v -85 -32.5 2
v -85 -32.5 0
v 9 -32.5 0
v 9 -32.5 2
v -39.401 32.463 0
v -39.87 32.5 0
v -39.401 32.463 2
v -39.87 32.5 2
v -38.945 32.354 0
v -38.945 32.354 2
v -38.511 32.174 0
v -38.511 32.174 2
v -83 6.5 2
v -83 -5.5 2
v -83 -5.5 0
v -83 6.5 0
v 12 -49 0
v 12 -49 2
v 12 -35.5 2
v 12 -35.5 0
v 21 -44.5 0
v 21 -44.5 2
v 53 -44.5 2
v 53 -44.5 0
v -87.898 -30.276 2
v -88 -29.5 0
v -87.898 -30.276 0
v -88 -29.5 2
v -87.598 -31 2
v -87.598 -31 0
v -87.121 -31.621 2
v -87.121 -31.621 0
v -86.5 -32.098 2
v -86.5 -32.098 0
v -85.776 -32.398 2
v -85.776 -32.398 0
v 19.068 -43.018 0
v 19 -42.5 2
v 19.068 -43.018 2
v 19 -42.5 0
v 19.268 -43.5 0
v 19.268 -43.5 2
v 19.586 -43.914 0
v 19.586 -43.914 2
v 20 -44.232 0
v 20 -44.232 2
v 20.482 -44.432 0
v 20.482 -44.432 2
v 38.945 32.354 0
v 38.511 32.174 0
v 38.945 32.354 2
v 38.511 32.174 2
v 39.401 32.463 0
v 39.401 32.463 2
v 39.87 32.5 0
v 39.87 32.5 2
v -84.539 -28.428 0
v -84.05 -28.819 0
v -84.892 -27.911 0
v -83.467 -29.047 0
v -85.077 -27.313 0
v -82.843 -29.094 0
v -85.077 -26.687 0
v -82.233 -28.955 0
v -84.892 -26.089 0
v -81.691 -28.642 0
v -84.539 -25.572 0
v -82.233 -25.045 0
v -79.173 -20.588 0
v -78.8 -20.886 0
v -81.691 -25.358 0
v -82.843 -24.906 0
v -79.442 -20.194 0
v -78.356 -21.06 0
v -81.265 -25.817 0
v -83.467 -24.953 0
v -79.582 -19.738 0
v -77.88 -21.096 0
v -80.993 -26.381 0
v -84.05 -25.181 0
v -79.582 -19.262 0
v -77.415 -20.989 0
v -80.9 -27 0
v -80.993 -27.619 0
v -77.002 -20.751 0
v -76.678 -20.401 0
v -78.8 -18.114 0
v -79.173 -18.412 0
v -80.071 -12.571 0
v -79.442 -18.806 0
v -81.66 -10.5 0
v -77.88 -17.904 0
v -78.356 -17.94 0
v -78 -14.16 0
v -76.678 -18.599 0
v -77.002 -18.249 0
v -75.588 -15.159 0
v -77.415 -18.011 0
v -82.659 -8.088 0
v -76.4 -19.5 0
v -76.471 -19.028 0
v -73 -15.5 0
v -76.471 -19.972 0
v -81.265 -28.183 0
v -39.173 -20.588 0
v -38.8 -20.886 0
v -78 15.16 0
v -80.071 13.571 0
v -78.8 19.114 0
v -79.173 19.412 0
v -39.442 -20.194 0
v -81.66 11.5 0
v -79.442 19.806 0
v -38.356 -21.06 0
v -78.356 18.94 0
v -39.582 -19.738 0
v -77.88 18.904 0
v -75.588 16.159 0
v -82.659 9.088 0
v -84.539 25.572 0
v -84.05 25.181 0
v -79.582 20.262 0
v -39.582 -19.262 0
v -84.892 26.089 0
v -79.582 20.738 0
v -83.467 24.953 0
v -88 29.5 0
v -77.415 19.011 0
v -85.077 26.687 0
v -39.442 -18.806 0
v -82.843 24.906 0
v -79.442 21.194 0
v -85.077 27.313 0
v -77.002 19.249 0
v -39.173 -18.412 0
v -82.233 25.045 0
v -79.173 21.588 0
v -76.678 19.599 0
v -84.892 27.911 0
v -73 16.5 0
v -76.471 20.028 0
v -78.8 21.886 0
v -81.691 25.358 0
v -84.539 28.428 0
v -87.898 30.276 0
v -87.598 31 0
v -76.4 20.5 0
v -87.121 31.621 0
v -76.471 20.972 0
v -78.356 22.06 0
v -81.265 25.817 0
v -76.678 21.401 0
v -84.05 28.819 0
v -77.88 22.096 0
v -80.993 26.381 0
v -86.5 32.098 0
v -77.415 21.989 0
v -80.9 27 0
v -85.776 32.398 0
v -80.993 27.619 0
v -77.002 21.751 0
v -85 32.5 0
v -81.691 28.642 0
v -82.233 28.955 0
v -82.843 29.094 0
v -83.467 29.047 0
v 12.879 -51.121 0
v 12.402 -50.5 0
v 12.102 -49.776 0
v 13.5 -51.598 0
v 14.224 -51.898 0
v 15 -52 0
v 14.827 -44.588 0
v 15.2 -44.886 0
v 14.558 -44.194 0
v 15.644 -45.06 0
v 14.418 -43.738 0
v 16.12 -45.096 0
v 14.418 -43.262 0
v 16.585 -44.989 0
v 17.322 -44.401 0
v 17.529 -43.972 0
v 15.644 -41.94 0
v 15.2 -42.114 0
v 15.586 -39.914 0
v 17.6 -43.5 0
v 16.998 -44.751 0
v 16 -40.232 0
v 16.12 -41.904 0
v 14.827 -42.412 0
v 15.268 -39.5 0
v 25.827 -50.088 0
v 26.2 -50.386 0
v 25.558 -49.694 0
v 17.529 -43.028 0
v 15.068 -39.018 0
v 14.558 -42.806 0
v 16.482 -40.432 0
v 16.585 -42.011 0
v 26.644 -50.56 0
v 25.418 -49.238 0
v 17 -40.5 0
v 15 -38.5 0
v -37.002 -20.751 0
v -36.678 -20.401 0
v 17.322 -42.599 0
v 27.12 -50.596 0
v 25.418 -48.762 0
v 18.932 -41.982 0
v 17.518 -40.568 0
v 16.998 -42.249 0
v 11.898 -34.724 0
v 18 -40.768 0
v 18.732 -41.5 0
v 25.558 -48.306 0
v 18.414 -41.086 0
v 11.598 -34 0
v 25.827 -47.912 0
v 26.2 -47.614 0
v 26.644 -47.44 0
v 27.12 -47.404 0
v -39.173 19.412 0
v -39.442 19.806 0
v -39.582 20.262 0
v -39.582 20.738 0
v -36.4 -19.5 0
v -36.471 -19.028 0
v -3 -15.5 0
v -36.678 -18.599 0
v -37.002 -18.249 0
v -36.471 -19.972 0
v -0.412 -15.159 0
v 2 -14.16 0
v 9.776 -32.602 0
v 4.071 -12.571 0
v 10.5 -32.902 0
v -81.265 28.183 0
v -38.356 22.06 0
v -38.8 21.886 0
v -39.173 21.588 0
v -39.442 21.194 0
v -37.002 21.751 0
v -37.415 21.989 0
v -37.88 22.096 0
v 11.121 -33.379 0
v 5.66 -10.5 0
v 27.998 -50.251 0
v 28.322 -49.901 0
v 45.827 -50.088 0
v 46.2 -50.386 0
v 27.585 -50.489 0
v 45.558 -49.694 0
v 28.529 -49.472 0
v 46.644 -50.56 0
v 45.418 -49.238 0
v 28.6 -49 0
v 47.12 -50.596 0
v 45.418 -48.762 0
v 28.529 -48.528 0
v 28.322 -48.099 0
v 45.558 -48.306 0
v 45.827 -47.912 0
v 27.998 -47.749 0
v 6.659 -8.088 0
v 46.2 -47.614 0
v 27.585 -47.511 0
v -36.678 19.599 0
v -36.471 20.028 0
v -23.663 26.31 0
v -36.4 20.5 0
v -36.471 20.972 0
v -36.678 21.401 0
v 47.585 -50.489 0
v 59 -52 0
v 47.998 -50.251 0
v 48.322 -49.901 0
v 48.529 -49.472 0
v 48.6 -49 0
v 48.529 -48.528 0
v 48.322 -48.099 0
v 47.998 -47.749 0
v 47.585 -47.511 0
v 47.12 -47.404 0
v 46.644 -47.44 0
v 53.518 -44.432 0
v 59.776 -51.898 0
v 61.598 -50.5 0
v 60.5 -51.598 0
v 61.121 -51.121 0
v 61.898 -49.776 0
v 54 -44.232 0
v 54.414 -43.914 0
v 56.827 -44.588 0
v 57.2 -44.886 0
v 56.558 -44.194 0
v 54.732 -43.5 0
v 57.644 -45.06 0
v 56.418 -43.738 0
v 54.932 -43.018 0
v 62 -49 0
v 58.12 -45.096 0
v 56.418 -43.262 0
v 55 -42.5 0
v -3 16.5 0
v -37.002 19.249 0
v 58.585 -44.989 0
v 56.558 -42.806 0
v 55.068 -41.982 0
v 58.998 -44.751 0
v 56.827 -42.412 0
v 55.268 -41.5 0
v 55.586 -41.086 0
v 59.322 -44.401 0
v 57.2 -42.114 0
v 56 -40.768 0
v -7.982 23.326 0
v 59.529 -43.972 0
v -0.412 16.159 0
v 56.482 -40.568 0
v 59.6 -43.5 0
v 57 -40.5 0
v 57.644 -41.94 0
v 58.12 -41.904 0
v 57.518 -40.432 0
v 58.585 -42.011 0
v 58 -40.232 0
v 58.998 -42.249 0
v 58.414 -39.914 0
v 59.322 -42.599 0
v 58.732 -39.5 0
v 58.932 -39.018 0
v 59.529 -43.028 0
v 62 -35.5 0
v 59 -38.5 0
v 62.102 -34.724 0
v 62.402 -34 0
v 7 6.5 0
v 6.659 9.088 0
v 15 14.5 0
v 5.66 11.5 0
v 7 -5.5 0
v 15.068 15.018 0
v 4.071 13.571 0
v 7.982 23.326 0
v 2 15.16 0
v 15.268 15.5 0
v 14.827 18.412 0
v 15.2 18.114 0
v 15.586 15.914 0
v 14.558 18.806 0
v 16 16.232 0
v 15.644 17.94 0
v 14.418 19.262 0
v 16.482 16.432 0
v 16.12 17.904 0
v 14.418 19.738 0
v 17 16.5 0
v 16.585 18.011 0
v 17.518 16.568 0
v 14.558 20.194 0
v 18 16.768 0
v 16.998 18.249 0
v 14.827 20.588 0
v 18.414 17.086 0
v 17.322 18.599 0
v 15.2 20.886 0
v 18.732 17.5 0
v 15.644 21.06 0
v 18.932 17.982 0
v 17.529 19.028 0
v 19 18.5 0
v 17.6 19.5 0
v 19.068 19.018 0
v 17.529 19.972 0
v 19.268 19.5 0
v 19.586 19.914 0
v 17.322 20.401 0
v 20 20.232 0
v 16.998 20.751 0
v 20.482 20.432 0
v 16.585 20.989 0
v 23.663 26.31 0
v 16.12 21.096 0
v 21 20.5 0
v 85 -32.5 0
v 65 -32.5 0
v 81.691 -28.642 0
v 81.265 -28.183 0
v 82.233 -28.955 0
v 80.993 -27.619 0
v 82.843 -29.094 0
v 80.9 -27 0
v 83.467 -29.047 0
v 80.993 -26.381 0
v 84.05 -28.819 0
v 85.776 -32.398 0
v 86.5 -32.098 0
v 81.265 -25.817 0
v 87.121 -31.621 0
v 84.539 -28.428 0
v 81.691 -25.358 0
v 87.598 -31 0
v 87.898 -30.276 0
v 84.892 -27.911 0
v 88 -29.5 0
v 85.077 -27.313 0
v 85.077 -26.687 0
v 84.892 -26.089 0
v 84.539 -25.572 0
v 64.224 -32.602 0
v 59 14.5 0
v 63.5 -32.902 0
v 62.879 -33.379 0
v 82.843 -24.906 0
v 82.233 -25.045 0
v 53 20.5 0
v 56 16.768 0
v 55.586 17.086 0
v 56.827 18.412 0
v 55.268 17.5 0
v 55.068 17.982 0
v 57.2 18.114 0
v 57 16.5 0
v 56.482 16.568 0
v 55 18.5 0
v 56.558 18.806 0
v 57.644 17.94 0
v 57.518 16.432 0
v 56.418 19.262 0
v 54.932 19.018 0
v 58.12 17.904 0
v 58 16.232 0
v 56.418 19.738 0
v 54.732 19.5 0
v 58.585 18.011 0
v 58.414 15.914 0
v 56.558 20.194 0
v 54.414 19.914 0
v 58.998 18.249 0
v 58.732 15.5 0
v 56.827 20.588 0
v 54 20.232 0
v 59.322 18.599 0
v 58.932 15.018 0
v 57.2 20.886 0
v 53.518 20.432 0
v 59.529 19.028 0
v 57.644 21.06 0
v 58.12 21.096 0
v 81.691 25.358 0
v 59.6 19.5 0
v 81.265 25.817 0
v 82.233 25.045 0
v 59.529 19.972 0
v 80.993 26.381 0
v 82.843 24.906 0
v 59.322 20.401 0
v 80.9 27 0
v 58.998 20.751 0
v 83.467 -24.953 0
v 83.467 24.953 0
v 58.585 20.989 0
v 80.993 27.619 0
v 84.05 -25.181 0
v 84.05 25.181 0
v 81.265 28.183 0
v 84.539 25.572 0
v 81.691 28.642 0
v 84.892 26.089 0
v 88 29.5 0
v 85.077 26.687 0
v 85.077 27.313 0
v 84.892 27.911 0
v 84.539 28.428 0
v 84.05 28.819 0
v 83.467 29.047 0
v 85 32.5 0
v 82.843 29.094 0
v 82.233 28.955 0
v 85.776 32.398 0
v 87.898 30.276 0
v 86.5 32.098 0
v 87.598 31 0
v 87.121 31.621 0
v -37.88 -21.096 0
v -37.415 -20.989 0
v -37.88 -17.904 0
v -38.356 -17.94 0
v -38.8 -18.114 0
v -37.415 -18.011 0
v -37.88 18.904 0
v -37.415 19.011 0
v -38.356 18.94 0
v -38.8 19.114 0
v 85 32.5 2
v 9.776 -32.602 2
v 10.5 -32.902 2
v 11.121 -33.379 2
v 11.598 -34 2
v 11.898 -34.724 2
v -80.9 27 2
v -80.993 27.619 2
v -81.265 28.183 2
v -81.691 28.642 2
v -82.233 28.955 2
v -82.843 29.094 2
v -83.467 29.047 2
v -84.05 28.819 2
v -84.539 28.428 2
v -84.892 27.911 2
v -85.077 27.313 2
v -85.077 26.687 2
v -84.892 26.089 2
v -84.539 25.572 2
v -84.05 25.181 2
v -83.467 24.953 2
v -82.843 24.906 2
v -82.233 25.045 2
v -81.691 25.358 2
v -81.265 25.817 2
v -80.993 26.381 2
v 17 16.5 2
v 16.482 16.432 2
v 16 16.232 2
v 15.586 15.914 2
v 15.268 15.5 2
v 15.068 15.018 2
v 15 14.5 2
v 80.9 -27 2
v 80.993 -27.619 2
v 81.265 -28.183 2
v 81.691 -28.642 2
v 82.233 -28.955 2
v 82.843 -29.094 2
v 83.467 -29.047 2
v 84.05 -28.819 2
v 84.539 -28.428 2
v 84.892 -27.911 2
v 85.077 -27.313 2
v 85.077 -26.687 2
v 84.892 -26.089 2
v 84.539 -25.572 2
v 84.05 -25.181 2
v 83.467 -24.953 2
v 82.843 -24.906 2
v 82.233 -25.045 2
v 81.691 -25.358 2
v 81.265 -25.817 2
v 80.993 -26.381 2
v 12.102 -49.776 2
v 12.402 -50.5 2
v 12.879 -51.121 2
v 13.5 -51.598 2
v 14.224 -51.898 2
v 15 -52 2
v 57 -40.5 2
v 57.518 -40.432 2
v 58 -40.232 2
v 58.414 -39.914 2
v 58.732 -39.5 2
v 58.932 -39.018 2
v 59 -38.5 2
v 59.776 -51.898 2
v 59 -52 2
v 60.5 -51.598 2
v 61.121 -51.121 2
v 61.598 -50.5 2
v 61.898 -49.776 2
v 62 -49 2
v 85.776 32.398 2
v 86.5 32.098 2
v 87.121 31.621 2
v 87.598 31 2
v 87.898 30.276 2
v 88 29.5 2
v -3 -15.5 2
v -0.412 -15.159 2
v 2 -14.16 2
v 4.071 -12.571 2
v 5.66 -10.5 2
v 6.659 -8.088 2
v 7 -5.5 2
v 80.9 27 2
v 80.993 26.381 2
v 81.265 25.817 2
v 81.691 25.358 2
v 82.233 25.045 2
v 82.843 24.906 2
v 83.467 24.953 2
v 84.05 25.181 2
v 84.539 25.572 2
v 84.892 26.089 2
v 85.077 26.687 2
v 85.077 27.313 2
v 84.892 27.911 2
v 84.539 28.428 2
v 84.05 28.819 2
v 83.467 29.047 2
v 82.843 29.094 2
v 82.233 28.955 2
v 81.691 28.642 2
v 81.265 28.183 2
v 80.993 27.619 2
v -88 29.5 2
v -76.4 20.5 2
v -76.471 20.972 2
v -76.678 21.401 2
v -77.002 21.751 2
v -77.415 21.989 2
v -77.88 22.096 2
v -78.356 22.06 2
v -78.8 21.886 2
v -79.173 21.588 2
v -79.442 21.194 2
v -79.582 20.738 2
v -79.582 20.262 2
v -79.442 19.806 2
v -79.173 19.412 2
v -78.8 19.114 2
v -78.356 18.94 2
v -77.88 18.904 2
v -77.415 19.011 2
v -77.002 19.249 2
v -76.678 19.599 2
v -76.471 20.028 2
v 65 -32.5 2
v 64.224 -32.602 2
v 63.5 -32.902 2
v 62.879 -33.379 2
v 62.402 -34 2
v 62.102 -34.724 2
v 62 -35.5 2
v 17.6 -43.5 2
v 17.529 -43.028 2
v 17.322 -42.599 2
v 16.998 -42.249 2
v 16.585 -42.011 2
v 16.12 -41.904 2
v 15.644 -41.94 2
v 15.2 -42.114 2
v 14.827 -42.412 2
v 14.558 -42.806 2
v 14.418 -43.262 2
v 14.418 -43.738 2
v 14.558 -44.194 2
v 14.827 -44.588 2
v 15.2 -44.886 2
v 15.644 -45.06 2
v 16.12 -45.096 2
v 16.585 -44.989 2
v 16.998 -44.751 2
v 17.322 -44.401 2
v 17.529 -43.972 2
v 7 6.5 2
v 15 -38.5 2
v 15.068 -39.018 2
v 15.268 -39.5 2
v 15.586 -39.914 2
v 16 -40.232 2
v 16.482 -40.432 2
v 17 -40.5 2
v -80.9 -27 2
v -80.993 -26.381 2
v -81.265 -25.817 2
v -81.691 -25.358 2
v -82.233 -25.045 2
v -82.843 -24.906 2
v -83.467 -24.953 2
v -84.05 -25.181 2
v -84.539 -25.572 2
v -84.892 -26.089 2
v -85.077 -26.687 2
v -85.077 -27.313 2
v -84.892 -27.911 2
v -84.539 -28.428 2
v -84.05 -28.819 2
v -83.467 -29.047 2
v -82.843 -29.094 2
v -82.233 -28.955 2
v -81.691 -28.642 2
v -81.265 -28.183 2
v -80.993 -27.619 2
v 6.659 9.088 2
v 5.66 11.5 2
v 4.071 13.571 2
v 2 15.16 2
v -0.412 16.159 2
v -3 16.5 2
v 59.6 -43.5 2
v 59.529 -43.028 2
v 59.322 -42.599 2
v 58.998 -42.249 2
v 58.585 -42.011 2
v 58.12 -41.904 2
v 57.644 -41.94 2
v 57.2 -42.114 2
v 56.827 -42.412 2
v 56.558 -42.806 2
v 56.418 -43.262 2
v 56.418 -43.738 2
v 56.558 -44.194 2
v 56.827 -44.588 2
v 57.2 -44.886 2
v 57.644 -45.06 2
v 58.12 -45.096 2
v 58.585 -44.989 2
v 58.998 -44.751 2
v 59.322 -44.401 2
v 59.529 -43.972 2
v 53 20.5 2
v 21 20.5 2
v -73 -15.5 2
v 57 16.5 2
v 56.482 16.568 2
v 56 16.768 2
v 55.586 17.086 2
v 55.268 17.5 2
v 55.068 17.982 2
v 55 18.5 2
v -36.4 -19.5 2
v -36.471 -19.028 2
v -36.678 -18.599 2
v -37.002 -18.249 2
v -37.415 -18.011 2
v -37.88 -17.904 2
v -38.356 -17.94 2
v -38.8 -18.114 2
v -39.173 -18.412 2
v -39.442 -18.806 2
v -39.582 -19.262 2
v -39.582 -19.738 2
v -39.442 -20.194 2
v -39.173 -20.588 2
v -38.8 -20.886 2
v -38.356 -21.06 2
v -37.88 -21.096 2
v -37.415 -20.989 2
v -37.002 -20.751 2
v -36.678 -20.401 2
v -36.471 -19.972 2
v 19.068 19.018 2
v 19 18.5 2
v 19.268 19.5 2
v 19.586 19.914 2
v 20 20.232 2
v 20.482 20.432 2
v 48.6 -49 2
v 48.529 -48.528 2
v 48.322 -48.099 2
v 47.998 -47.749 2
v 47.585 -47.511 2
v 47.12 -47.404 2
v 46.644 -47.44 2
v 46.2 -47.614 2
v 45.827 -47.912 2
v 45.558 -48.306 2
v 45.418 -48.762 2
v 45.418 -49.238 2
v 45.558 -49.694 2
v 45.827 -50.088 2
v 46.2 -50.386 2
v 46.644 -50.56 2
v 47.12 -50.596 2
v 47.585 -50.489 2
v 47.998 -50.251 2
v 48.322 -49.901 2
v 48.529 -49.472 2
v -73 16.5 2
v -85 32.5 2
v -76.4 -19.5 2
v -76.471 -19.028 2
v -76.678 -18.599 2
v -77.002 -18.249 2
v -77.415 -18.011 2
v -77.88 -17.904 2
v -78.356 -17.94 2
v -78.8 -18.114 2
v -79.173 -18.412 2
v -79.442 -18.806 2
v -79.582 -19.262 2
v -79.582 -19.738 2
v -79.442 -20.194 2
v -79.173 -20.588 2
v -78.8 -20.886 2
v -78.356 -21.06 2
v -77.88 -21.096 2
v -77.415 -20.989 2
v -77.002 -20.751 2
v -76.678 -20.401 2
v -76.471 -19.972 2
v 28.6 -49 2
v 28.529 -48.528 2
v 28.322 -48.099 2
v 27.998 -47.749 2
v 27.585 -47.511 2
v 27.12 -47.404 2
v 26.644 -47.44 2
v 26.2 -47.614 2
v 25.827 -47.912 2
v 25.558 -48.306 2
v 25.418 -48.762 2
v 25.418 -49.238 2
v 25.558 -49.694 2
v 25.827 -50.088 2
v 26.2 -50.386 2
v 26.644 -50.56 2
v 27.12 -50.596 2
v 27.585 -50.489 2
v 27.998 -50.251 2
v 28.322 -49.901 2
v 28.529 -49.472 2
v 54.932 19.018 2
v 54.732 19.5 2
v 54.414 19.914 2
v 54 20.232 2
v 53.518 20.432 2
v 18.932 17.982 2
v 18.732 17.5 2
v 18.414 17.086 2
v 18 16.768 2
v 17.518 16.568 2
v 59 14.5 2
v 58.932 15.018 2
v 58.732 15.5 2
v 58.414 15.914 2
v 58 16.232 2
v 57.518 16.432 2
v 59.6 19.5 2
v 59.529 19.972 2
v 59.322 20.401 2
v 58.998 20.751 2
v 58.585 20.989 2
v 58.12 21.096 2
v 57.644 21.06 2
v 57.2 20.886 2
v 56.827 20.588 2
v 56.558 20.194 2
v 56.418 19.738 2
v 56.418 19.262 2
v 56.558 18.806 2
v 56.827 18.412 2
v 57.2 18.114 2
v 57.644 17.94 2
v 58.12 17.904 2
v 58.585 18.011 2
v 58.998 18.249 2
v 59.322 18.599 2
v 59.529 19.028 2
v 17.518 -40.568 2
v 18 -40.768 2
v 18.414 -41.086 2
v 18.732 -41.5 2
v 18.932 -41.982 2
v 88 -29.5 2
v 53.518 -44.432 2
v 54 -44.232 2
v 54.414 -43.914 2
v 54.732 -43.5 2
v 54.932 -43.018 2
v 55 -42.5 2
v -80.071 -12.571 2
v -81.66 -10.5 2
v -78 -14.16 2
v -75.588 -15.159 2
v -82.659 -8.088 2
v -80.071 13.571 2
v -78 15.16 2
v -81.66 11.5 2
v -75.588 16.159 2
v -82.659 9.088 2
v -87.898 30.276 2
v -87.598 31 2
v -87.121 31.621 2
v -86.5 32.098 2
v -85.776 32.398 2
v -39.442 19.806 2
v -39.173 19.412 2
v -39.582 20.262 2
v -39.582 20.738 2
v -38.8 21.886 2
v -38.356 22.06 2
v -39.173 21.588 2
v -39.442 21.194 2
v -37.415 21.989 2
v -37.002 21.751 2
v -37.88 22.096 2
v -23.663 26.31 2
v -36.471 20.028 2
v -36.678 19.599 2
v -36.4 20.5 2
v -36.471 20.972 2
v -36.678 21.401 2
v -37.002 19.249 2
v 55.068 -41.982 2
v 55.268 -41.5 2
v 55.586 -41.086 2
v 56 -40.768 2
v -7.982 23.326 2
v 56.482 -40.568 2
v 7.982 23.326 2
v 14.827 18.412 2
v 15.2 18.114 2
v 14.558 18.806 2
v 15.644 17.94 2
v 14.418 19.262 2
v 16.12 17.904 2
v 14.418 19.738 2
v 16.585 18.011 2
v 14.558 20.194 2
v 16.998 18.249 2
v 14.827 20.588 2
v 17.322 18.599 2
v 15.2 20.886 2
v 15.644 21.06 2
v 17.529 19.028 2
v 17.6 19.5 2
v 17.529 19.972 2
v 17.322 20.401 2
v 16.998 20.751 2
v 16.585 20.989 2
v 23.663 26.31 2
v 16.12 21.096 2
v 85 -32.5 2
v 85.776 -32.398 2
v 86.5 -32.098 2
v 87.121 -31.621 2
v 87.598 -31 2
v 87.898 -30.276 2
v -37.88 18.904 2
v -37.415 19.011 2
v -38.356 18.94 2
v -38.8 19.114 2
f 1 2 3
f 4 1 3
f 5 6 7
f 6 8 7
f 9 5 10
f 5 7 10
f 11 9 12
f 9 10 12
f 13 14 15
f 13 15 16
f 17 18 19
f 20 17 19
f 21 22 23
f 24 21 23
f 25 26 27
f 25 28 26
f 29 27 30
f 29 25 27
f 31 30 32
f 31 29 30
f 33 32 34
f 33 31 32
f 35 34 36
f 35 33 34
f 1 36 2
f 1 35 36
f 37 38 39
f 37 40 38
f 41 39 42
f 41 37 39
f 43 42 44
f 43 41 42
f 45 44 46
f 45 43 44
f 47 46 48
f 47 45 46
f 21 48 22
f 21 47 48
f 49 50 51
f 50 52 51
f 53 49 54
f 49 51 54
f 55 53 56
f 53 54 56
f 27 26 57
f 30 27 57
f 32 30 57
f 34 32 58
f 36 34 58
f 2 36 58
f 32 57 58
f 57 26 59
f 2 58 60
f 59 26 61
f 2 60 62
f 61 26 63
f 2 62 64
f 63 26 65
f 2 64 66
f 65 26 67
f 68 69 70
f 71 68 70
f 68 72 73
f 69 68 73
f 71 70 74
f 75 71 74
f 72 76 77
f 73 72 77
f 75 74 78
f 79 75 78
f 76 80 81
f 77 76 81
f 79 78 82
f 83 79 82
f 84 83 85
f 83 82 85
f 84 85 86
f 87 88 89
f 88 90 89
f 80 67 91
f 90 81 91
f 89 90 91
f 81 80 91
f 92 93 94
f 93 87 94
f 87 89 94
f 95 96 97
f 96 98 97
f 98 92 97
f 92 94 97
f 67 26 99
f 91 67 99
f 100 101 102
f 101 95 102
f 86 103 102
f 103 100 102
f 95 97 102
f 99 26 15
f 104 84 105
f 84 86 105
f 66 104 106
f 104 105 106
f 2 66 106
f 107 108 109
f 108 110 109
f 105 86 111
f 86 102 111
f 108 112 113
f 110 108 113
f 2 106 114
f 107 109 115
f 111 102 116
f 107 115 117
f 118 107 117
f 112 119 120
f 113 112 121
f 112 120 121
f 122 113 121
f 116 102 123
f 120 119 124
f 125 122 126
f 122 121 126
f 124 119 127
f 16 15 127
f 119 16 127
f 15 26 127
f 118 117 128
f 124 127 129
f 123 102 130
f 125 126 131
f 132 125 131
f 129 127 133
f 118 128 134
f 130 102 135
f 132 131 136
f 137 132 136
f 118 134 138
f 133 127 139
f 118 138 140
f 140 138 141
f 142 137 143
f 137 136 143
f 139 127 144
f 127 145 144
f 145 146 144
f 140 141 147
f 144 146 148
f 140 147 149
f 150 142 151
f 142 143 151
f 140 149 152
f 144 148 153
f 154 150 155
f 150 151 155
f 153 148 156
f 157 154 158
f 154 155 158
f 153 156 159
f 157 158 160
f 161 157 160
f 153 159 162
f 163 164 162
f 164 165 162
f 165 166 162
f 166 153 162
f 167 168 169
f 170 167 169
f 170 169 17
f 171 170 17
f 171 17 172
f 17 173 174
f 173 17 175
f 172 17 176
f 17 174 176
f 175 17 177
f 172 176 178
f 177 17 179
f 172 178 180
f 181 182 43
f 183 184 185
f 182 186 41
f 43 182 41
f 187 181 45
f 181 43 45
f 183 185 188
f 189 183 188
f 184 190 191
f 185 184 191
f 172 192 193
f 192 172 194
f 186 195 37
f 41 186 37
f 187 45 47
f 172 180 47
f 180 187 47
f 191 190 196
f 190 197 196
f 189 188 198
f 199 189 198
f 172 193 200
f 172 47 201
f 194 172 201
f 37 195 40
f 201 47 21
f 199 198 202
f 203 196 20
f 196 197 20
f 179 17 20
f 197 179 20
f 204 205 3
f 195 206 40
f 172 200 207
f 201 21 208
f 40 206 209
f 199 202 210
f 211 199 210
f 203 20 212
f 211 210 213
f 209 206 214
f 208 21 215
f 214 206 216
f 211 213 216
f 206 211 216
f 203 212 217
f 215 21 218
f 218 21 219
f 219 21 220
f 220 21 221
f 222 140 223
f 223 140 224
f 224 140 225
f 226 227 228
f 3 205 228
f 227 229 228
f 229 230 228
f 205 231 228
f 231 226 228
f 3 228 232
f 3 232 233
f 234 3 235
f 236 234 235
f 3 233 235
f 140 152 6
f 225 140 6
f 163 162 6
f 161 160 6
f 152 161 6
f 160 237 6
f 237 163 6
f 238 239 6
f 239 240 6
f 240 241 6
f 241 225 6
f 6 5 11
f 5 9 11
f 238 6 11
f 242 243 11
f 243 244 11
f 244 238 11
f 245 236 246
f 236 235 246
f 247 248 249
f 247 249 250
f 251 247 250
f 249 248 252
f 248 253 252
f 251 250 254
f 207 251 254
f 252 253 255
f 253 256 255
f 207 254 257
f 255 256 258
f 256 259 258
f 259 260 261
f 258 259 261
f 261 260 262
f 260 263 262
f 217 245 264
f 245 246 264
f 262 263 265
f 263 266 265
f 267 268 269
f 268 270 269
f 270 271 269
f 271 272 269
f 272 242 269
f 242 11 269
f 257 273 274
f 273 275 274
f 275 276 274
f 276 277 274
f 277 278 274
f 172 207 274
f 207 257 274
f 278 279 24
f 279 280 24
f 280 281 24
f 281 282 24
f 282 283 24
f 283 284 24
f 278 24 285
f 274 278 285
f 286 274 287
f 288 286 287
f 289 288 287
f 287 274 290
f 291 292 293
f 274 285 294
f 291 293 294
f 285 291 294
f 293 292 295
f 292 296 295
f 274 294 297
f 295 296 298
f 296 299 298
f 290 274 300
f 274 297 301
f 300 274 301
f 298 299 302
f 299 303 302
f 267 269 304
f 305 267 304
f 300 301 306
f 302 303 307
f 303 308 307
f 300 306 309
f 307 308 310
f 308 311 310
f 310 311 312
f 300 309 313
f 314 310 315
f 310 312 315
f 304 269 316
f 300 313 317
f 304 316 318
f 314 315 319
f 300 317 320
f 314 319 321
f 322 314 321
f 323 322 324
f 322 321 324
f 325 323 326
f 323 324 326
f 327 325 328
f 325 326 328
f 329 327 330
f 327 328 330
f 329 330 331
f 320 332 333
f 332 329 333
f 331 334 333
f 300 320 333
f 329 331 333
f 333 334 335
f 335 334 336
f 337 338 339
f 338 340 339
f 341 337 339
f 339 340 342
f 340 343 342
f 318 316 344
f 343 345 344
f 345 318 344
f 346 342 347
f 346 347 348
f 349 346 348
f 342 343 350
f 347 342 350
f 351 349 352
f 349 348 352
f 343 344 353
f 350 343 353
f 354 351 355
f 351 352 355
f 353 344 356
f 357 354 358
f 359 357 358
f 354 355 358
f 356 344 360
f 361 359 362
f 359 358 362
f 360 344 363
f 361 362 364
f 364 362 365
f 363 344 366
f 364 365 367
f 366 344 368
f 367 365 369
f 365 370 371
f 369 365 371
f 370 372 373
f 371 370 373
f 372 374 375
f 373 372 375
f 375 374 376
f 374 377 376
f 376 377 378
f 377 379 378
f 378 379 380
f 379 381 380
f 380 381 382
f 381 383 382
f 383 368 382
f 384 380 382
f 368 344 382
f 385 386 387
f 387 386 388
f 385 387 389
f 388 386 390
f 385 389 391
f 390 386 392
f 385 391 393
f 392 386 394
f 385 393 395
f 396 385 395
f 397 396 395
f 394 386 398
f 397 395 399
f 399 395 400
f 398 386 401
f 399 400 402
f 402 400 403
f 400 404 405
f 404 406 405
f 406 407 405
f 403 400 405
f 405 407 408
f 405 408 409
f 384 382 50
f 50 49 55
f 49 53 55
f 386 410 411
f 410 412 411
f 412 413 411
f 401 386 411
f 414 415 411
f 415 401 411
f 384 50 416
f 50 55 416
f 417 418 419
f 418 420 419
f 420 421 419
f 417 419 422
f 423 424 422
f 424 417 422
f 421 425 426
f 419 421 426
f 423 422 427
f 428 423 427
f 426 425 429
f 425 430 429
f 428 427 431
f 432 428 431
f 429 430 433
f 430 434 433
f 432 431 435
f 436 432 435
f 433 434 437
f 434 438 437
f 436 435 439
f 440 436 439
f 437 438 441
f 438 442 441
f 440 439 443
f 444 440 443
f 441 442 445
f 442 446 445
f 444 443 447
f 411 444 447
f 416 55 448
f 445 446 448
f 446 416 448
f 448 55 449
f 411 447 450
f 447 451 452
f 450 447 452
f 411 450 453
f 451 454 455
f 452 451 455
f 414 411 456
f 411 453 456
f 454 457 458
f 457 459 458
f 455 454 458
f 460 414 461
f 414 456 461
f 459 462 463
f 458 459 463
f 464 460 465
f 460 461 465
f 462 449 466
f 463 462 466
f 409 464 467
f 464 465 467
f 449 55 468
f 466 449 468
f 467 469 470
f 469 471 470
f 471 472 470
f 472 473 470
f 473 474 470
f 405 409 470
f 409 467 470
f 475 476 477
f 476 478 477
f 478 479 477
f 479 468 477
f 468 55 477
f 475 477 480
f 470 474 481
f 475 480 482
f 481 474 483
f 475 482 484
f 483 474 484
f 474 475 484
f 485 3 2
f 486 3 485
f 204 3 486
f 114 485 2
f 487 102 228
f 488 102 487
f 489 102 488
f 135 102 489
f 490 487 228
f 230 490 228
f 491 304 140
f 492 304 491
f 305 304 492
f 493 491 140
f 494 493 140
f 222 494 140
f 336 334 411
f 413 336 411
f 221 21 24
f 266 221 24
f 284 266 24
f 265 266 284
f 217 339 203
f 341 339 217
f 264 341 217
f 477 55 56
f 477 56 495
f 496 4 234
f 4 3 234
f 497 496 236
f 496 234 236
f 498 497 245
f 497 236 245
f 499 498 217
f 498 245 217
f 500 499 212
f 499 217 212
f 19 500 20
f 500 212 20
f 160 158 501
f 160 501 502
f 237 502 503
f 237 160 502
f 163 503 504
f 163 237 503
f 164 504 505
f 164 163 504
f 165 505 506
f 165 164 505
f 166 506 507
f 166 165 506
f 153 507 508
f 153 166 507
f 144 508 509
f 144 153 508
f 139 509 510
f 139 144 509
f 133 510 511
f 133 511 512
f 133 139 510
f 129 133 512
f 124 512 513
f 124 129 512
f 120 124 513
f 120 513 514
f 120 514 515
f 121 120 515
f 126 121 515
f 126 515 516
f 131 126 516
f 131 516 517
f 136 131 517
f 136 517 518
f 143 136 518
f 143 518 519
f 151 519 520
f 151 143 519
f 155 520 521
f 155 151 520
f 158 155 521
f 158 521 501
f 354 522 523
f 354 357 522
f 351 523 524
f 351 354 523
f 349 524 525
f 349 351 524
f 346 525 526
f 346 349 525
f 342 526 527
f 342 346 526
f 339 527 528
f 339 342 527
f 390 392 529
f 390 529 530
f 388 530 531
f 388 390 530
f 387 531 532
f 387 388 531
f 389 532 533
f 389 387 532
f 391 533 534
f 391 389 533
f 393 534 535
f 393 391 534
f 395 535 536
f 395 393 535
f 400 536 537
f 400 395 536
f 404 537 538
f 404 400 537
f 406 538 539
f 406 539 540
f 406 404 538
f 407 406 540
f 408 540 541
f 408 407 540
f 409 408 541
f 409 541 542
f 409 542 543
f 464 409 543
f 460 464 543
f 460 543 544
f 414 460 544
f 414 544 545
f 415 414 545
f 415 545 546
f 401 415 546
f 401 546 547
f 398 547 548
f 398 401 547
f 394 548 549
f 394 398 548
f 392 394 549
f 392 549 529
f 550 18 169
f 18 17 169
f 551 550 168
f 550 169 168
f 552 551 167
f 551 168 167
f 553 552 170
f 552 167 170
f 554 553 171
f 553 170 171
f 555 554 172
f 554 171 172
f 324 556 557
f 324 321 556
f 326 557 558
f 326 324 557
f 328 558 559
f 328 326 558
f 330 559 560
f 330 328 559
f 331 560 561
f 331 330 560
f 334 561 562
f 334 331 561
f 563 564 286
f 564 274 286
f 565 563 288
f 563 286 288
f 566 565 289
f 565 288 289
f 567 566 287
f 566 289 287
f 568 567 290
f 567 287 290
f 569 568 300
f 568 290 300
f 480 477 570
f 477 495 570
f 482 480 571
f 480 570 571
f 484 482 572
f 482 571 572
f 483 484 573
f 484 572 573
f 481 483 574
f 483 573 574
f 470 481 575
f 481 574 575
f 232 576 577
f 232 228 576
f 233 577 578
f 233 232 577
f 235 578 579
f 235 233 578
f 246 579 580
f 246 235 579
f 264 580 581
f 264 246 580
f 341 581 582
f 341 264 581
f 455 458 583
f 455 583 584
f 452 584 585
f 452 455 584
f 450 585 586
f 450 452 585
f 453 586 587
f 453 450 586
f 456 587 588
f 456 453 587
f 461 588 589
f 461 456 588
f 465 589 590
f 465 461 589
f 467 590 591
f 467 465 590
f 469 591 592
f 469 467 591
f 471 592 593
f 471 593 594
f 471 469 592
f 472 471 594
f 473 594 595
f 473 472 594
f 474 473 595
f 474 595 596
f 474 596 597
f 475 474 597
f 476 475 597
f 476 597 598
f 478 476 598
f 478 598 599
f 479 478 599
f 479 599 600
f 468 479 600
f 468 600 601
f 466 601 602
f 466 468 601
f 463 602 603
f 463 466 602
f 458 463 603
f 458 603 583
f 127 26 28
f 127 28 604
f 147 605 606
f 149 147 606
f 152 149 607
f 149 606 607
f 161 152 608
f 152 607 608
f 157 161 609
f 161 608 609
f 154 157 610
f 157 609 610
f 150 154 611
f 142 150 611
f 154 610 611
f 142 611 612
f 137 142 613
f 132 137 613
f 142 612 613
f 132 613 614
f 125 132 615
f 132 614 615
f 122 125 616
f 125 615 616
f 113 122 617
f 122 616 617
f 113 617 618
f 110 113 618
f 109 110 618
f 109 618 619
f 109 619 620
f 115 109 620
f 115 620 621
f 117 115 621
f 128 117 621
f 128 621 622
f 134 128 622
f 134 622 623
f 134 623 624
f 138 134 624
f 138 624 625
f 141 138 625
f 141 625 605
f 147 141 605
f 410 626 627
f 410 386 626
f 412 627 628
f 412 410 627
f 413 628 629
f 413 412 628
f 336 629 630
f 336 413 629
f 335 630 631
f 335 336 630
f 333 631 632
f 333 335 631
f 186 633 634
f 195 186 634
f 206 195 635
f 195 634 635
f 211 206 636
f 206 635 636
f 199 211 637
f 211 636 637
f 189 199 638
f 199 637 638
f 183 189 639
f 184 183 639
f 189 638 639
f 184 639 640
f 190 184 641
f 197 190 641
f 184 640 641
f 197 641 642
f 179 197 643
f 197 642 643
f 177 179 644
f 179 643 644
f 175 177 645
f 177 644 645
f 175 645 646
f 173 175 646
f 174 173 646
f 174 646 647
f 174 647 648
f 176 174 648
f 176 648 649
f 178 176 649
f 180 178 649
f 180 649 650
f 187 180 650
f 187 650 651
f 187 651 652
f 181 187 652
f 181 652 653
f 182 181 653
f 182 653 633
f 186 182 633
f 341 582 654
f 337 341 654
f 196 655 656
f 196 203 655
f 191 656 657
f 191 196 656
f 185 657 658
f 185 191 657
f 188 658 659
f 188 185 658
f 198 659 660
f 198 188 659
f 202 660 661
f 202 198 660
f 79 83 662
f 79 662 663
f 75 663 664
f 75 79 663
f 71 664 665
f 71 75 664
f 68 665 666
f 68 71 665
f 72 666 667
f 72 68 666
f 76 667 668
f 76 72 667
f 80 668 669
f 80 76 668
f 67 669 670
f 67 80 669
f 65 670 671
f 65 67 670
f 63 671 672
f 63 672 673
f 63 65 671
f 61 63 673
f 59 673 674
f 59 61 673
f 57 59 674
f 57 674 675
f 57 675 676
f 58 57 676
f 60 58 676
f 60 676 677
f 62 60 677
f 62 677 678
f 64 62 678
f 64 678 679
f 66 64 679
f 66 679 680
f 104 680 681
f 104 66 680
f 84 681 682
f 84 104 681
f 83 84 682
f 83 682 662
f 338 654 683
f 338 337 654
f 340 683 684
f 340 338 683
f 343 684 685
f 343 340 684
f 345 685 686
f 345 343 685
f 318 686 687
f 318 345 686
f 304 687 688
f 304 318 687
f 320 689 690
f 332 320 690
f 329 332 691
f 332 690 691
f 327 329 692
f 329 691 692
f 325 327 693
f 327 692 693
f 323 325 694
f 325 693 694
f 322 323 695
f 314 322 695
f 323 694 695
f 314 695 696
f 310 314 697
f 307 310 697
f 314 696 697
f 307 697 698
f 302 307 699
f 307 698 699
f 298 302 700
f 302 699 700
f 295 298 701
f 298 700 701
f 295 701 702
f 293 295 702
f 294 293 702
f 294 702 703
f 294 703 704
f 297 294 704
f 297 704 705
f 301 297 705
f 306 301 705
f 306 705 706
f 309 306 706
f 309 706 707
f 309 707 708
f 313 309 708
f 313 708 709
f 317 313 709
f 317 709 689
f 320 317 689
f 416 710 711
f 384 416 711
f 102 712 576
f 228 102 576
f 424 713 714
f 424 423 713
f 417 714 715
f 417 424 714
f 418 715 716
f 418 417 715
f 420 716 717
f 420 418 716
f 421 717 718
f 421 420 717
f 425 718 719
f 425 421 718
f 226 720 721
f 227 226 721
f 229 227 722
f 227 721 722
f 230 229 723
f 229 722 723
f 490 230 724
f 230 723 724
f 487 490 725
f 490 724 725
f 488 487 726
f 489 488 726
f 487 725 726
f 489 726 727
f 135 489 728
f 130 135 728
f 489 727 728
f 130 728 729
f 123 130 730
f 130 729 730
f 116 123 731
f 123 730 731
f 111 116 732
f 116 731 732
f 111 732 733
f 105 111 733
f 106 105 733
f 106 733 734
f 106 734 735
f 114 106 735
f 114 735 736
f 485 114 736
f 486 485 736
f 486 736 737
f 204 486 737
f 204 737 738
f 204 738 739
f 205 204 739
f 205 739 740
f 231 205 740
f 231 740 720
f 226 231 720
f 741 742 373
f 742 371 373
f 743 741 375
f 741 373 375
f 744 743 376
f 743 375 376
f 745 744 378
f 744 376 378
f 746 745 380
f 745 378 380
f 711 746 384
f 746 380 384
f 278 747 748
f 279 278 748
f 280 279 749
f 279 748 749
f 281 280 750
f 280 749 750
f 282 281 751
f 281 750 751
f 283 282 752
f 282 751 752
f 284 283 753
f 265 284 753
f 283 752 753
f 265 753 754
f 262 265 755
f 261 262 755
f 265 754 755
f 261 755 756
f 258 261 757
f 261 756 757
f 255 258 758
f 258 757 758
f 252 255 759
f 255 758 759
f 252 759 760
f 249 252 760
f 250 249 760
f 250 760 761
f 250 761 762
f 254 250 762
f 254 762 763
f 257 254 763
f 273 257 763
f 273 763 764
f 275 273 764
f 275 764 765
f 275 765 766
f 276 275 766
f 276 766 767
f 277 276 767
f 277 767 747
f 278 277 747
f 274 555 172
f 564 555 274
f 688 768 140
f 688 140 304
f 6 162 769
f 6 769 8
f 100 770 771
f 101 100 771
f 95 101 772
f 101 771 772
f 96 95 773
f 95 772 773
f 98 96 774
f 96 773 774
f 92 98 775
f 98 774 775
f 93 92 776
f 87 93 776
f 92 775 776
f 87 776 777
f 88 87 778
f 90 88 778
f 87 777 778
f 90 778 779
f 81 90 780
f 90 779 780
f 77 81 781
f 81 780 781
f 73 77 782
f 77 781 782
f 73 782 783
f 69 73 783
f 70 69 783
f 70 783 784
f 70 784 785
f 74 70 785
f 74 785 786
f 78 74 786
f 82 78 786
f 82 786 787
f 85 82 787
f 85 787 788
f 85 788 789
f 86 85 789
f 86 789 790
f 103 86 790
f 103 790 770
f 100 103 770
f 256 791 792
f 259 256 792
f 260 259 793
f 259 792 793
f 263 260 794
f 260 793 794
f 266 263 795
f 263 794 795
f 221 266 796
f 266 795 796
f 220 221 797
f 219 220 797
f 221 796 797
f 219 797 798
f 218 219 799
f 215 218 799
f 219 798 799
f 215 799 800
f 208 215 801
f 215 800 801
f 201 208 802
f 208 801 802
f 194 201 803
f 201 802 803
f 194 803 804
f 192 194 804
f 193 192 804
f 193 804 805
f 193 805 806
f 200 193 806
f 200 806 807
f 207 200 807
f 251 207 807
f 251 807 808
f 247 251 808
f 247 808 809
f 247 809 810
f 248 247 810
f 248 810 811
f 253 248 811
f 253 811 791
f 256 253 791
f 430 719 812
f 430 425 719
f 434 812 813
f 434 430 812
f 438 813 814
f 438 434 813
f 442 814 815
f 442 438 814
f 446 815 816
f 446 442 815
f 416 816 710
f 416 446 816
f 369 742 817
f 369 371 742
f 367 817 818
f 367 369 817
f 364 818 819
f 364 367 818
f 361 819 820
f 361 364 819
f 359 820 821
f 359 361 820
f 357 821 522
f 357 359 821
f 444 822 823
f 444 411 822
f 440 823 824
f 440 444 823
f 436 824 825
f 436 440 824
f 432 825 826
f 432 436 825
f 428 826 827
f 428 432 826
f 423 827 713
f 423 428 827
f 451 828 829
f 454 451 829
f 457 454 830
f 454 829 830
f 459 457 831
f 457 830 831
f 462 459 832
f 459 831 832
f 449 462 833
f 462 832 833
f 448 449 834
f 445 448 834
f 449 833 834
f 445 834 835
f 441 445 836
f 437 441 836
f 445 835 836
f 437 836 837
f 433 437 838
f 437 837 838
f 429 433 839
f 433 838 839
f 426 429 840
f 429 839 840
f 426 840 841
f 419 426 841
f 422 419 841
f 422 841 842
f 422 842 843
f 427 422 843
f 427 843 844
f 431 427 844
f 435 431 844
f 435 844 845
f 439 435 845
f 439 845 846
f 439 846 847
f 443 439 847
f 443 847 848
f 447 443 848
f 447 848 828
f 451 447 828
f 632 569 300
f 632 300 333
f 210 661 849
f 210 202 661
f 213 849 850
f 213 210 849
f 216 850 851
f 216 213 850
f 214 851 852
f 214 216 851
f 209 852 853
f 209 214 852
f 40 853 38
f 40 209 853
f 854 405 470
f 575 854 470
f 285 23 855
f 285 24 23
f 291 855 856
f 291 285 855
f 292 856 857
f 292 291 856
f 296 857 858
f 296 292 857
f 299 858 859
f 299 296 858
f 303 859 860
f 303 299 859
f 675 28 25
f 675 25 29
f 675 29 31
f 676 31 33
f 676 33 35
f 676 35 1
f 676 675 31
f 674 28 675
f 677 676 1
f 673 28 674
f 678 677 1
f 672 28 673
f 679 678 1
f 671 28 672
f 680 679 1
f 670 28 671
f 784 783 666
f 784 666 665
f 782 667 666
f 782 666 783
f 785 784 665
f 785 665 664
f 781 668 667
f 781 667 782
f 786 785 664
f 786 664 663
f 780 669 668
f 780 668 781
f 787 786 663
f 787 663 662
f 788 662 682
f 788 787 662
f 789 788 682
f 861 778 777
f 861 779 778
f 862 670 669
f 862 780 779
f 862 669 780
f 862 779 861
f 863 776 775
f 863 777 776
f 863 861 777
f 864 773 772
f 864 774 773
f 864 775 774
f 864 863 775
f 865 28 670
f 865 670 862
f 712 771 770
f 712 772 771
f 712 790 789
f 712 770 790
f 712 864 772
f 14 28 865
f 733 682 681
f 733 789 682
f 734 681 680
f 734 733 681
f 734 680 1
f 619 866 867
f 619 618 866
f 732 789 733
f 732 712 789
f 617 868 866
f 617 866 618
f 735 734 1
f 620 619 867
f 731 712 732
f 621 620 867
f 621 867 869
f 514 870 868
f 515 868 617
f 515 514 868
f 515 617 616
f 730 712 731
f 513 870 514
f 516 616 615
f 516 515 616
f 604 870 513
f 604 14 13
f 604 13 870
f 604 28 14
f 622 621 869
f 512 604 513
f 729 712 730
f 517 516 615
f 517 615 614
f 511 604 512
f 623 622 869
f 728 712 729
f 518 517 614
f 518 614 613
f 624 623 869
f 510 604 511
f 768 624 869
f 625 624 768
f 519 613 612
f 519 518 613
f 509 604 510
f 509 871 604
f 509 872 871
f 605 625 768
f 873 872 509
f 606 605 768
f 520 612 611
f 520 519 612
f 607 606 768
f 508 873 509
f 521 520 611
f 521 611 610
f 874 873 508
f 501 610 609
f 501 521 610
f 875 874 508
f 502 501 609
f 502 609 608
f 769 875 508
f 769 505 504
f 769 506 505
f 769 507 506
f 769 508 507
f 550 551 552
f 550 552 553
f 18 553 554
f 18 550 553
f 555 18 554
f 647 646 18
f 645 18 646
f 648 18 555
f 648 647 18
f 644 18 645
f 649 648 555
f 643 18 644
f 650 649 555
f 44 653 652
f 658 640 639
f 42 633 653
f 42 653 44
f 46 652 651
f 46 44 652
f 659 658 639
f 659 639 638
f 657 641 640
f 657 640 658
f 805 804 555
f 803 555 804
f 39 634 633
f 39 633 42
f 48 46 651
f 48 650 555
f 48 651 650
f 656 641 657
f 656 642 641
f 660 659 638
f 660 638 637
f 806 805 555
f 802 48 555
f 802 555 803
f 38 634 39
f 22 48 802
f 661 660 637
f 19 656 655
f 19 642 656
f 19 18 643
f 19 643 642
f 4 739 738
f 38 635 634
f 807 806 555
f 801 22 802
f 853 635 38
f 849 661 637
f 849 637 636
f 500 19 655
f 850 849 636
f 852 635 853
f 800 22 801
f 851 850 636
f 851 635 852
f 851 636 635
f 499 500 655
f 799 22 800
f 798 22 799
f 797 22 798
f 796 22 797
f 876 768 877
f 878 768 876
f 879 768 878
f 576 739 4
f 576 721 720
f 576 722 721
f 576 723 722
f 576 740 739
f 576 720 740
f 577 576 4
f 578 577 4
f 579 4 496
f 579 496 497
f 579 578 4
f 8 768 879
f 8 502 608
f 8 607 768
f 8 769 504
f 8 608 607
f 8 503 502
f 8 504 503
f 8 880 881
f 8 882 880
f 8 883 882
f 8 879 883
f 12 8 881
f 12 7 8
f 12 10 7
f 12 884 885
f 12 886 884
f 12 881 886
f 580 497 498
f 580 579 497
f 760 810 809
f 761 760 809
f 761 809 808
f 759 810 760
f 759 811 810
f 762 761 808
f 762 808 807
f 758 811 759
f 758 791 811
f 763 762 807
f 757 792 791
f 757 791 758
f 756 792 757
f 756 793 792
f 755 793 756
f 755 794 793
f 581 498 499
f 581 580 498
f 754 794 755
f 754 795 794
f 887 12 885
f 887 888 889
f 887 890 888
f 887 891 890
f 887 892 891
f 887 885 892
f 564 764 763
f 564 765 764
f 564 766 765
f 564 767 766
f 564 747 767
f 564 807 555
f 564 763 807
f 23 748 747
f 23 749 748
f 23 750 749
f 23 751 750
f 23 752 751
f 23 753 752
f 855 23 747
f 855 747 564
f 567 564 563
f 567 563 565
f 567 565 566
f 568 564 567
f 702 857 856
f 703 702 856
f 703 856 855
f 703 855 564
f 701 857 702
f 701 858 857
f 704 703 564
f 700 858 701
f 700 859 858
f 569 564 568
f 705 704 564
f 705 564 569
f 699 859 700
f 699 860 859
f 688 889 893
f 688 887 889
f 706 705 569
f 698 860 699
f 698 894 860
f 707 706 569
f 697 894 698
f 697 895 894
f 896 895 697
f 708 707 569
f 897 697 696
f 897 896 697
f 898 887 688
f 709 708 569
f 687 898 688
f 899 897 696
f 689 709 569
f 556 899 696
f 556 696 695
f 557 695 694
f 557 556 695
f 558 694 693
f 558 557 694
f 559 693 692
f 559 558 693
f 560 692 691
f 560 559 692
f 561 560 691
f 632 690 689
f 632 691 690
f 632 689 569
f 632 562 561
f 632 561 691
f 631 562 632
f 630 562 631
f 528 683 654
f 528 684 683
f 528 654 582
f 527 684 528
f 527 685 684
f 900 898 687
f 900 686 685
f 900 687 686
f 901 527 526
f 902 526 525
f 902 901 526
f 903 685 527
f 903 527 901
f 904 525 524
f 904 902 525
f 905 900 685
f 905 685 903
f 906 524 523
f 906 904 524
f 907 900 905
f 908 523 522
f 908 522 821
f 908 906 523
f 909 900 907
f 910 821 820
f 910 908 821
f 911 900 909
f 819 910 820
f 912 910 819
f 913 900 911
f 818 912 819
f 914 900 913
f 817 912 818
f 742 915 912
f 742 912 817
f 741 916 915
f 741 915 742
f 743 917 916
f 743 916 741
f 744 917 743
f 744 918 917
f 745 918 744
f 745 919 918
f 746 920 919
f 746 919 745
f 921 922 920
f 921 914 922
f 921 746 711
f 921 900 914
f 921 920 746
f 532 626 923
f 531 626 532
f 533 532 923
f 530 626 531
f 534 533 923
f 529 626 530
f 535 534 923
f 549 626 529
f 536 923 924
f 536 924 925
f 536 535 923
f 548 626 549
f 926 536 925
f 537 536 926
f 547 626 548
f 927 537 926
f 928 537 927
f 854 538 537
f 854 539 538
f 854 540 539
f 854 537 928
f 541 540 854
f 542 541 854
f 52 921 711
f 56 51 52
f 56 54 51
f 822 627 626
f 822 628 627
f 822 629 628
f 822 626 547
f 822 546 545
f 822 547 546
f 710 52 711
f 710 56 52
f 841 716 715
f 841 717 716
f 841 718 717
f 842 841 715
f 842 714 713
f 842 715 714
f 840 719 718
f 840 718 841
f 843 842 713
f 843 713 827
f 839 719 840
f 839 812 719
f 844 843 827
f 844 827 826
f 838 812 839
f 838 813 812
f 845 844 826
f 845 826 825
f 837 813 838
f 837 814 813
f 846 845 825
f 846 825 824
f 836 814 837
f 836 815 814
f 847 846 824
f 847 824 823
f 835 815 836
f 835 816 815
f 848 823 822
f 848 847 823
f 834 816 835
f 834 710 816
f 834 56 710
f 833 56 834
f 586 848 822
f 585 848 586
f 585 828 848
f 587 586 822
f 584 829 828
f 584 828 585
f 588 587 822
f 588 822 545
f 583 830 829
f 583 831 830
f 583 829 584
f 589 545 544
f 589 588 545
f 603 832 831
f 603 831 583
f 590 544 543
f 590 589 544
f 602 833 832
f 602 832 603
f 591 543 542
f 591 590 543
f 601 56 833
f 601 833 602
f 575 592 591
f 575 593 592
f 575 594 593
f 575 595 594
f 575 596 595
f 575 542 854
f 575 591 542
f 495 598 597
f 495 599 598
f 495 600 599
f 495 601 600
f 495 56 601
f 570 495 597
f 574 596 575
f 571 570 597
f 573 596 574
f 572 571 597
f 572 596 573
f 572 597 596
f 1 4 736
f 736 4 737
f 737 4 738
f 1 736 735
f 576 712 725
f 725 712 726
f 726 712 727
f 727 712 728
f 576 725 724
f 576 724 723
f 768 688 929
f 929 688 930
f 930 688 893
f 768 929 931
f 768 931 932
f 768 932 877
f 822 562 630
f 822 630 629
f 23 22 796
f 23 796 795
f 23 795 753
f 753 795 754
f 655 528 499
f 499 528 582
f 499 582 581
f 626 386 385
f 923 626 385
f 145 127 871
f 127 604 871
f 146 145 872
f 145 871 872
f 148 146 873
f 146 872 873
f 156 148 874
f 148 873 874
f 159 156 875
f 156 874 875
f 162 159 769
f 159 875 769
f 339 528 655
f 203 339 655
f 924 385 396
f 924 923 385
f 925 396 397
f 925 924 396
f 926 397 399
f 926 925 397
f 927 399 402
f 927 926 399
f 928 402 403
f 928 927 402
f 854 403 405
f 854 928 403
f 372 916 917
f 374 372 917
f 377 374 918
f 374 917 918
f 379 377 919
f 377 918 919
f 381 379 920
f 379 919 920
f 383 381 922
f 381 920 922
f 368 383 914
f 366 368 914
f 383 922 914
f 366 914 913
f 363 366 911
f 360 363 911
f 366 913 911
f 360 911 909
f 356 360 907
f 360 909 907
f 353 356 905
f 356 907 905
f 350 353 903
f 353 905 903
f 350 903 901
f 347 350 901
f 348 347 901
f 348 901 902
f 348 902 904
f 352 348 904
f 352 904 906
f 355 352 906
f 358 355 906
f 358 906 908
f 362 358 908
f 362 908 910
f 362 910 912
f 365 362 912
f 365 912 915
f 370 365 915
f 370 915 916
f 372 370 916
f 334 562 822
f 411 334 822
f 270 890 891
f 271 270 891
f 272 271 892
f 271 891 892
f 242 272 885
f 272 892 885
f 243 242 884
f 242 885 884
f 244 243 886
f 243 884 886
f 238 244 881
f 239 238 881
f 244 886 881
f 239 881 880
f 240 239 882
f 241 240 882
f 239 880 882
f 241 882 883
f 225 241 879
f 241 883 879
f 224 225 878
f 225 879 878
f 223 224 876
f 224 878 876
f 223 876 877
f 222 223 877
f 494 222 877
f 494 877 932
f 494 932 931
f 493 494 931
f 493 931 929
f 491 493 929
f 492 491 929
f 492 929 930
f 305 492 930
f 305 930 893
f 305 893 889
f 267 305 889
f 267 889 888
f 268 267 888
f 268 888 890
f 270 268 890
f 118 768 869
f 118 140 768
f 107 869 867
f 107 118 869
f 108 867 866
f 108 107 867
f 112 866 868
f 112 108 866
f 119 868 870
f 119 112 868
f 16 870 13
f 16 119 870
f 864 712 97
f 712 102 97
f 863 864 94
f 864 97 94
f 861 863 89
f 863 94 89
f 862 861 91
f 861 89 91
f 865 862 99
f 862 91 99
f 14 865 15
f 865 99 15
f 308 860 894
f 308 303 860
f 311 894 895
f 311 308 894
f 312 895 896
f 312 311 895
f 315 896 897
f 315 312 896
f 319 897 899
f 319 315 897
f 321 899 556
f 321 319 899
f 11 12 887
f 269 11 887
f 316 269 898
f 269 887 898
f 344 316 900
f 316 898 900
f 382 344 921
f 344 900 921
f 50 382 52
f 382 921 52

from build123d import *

# Parameters (mm, degrees)
SKETCH_1_W          = 176
SKETCH_1_H          = 65
SKETCH_1_R          = 2.1
EXTRUDE_1_DEPTH     = 2
FILLET_1_R          = 3
SKETCH_2_R          = 85
CUT_EXTRUDE_1_DEPTH = 24
SKETCH_4_W          = 50
SKETCH_4_H          = 19.5
EXTRUDE_2_DEPTH     = 2
FILLET_2_R          = 3
SKETCH_3_R          = 1.6
CUT_EXTRUDE_2_DEPTH = 12
FILLET_3_R          = 2
SKETCH_5_R          = 1.6
CUT_EXTRUDE_3_DEPTH = 12
SKETCH_6_R          = 1.6
CUT_EXTRUDE_4_DEPTH = 12
SKETCH_7_W          = 90
SKETCH_7_H          = 32
CUT_EXTRUDE_5_DEPTH = 10
FILLET_4_R          = 10


with BuildPart() as part:
    # 草图1 → 凸台-拉伸1 (new body)
    with BuildSketch(Plane.XY):
        Rectangle(SKETCH_1_W, SKETCH_1_H)
        with Locations((-83, 27)):
            Circle(SKETCH_1_R, mode=Mode.SUBTRACT)
        with Locations((-83, -27)):
            Circle(SKETCH_1_R, mode=Mode.SUBTRACT)
        with Locations(Location((83, -27, 0), (0, 0, 180))):
            Circle(SKETCH_1_R, mode=Mode.SUBTRACT)
        with Locations(Location((83, 27, 0), (0, 0, 180))):
            Circle(SKETCH_1_R, mode=Mode.SUBTRACT)
    extrude(amount=EXTRUDE_1_DEPTH)

    # 圆角1
    fillet_1_edges = [part.edges().sort_by_distance(p)[0] for p in [
        (-88, 32.5, 1),
        (88, 32.5, 1),
        (88, -32.5, 1),
        (-88, -32.5, 1),
    ]]
    fillet(fillet_1_edges, radius=FILLET_1_R)

    # 草图2 → 切除-拉伸1 (cut)
    with BuildSketch(Plane.XY.offset(2)):
        with Locations((0, 107.95)):
            Circle(SKETCH_2_R)
    extrude(amount=-CUT_EXTRUDE_1_DEPTH, mode=Mode.SUBTRACT)

    # 草图4 → 凸台-拉伸2 (add)
    with BuildSketch(Plane.XY.offset(2)):
        with Locations((37, -42.25)):
            Rectangle(SKETCH_4_W, SKETCH_4_H)
    extrude(amount=-EXTRUDE_2_DEPTH)

    # 圆角2
    fillet_2_edges = [part.edges().sort_by_distance(p)[0] for p in [
        (-39.144571782, 32.5, 1),
        (39.144571782, 32.5, 1),
        (12, -52, 1),
        (12, -32.5, 1),
        (62, -32.5, 1),
        (62, -52, 1),
    ]]
    fillet(fillet_2_edges, radius=FILLET_2_R)

    # 草图3 → 切除-拉伸2 (cut)
    with BuildSketch(Plane.XY.offset(2)):
        with Locations((16, 19.5)):
            Circle(SKETCH_3_R)
        with Locations((58, 19.5)):
            Circle(SKETCH_3_R)
        with Locations((58, -43.5)):
            Circle(SKETCH_3_R)
        with Locations((16, -43.5)):
            Circle(SKETCH_3_R)
        Polygon((19, 20.5), (19, 16.5), (15, 16.5), (15, -40.5), (19, -40.5), (19, -44.5), (55, -44.5), (55, -40.5), (59, -40.5), (59, 16.5), (55, 16.5), (55, 20.5), align=None)
    extrude(amount=-CUT_EXTRUDE_2_DEPTH, mode=Mode.SUBTRACT)

    # 圆角3
    fillet_3_edges = [part.edges().sort_by_distance(p)[0] for p in [
        (55, 16.5, 1),
        (59, 16.5, 1),
        (59, -40.5, 1),
        (55, -40.5, 1),
        (55, -44.5, 1),
        (19, -44.5, 1),
        (19, -40.5, 1),
        (15, -40.5, 1),
        (19, 16.5, 1),
        (19, 20.5, 1),
        (55, 20.5, 1),
        (15, 16.5, 1),
    ]]
    fillet(fillet_3_edges, radius=FILLET_3_R - 0.0001)  # a hair under: the kernel refuses the full size

    # 草图5 → 切除-拉伸3 (cut)
    with BuildSketch(Plane.XY.offset(2)):
        with Locations((27, -49)):
            Circle(SKETCH_5_R)
        with Locations((47, -49)):
            Circle(SKETCH_5_R)
    extrude(amount=-CUT_EXTRUDE_3_DEPTH, mode=Mode.SUBTRACT)

    # 草图6 → 切除-拉伸4 (cut)
    with BuildSketch(Plane.XY.offset(2)):
        with Locations((-78, 20.5)):
            Circle(SKETCH_6_R)
        with Locations((-38, 20.5)):
            Circle(SKETCH_6_R)
        with Locations((-38, -19.5)):
            Circle(SKETCH_6_R)
        with Locations((-78, -19.5)):
            Circle(SKETCH_6_R)
    extrude(amount=-CUT_EXTRUDE_4_DEPTH, mode=Mode.SUBTRACT)

    # 草图7 → 切除-拉伸5 (cut)
    with BuildSketch(Plane.XY.offset(2)):
        with Locations((-38, 0.5)):
            Rectangle(SKETCH_7_W, SKETCH_7_H)
    extrude(amount=-CUT_EXTRUDE_5_DEPTH, mode=Mode.SUBTRACT)

    # 圆角4
    fillet_4_edges = [part.edges().sort_by_distance(p)[0] for p in [
        (-83, -15.5, 1),
        (-83, 16.5, 1),
        (7, 16.5, 1),
        (7, -15.5, 1),
    ]]
    fillet(fillet_4_edges, radius=FILLET_4_R)


solid = part.part
